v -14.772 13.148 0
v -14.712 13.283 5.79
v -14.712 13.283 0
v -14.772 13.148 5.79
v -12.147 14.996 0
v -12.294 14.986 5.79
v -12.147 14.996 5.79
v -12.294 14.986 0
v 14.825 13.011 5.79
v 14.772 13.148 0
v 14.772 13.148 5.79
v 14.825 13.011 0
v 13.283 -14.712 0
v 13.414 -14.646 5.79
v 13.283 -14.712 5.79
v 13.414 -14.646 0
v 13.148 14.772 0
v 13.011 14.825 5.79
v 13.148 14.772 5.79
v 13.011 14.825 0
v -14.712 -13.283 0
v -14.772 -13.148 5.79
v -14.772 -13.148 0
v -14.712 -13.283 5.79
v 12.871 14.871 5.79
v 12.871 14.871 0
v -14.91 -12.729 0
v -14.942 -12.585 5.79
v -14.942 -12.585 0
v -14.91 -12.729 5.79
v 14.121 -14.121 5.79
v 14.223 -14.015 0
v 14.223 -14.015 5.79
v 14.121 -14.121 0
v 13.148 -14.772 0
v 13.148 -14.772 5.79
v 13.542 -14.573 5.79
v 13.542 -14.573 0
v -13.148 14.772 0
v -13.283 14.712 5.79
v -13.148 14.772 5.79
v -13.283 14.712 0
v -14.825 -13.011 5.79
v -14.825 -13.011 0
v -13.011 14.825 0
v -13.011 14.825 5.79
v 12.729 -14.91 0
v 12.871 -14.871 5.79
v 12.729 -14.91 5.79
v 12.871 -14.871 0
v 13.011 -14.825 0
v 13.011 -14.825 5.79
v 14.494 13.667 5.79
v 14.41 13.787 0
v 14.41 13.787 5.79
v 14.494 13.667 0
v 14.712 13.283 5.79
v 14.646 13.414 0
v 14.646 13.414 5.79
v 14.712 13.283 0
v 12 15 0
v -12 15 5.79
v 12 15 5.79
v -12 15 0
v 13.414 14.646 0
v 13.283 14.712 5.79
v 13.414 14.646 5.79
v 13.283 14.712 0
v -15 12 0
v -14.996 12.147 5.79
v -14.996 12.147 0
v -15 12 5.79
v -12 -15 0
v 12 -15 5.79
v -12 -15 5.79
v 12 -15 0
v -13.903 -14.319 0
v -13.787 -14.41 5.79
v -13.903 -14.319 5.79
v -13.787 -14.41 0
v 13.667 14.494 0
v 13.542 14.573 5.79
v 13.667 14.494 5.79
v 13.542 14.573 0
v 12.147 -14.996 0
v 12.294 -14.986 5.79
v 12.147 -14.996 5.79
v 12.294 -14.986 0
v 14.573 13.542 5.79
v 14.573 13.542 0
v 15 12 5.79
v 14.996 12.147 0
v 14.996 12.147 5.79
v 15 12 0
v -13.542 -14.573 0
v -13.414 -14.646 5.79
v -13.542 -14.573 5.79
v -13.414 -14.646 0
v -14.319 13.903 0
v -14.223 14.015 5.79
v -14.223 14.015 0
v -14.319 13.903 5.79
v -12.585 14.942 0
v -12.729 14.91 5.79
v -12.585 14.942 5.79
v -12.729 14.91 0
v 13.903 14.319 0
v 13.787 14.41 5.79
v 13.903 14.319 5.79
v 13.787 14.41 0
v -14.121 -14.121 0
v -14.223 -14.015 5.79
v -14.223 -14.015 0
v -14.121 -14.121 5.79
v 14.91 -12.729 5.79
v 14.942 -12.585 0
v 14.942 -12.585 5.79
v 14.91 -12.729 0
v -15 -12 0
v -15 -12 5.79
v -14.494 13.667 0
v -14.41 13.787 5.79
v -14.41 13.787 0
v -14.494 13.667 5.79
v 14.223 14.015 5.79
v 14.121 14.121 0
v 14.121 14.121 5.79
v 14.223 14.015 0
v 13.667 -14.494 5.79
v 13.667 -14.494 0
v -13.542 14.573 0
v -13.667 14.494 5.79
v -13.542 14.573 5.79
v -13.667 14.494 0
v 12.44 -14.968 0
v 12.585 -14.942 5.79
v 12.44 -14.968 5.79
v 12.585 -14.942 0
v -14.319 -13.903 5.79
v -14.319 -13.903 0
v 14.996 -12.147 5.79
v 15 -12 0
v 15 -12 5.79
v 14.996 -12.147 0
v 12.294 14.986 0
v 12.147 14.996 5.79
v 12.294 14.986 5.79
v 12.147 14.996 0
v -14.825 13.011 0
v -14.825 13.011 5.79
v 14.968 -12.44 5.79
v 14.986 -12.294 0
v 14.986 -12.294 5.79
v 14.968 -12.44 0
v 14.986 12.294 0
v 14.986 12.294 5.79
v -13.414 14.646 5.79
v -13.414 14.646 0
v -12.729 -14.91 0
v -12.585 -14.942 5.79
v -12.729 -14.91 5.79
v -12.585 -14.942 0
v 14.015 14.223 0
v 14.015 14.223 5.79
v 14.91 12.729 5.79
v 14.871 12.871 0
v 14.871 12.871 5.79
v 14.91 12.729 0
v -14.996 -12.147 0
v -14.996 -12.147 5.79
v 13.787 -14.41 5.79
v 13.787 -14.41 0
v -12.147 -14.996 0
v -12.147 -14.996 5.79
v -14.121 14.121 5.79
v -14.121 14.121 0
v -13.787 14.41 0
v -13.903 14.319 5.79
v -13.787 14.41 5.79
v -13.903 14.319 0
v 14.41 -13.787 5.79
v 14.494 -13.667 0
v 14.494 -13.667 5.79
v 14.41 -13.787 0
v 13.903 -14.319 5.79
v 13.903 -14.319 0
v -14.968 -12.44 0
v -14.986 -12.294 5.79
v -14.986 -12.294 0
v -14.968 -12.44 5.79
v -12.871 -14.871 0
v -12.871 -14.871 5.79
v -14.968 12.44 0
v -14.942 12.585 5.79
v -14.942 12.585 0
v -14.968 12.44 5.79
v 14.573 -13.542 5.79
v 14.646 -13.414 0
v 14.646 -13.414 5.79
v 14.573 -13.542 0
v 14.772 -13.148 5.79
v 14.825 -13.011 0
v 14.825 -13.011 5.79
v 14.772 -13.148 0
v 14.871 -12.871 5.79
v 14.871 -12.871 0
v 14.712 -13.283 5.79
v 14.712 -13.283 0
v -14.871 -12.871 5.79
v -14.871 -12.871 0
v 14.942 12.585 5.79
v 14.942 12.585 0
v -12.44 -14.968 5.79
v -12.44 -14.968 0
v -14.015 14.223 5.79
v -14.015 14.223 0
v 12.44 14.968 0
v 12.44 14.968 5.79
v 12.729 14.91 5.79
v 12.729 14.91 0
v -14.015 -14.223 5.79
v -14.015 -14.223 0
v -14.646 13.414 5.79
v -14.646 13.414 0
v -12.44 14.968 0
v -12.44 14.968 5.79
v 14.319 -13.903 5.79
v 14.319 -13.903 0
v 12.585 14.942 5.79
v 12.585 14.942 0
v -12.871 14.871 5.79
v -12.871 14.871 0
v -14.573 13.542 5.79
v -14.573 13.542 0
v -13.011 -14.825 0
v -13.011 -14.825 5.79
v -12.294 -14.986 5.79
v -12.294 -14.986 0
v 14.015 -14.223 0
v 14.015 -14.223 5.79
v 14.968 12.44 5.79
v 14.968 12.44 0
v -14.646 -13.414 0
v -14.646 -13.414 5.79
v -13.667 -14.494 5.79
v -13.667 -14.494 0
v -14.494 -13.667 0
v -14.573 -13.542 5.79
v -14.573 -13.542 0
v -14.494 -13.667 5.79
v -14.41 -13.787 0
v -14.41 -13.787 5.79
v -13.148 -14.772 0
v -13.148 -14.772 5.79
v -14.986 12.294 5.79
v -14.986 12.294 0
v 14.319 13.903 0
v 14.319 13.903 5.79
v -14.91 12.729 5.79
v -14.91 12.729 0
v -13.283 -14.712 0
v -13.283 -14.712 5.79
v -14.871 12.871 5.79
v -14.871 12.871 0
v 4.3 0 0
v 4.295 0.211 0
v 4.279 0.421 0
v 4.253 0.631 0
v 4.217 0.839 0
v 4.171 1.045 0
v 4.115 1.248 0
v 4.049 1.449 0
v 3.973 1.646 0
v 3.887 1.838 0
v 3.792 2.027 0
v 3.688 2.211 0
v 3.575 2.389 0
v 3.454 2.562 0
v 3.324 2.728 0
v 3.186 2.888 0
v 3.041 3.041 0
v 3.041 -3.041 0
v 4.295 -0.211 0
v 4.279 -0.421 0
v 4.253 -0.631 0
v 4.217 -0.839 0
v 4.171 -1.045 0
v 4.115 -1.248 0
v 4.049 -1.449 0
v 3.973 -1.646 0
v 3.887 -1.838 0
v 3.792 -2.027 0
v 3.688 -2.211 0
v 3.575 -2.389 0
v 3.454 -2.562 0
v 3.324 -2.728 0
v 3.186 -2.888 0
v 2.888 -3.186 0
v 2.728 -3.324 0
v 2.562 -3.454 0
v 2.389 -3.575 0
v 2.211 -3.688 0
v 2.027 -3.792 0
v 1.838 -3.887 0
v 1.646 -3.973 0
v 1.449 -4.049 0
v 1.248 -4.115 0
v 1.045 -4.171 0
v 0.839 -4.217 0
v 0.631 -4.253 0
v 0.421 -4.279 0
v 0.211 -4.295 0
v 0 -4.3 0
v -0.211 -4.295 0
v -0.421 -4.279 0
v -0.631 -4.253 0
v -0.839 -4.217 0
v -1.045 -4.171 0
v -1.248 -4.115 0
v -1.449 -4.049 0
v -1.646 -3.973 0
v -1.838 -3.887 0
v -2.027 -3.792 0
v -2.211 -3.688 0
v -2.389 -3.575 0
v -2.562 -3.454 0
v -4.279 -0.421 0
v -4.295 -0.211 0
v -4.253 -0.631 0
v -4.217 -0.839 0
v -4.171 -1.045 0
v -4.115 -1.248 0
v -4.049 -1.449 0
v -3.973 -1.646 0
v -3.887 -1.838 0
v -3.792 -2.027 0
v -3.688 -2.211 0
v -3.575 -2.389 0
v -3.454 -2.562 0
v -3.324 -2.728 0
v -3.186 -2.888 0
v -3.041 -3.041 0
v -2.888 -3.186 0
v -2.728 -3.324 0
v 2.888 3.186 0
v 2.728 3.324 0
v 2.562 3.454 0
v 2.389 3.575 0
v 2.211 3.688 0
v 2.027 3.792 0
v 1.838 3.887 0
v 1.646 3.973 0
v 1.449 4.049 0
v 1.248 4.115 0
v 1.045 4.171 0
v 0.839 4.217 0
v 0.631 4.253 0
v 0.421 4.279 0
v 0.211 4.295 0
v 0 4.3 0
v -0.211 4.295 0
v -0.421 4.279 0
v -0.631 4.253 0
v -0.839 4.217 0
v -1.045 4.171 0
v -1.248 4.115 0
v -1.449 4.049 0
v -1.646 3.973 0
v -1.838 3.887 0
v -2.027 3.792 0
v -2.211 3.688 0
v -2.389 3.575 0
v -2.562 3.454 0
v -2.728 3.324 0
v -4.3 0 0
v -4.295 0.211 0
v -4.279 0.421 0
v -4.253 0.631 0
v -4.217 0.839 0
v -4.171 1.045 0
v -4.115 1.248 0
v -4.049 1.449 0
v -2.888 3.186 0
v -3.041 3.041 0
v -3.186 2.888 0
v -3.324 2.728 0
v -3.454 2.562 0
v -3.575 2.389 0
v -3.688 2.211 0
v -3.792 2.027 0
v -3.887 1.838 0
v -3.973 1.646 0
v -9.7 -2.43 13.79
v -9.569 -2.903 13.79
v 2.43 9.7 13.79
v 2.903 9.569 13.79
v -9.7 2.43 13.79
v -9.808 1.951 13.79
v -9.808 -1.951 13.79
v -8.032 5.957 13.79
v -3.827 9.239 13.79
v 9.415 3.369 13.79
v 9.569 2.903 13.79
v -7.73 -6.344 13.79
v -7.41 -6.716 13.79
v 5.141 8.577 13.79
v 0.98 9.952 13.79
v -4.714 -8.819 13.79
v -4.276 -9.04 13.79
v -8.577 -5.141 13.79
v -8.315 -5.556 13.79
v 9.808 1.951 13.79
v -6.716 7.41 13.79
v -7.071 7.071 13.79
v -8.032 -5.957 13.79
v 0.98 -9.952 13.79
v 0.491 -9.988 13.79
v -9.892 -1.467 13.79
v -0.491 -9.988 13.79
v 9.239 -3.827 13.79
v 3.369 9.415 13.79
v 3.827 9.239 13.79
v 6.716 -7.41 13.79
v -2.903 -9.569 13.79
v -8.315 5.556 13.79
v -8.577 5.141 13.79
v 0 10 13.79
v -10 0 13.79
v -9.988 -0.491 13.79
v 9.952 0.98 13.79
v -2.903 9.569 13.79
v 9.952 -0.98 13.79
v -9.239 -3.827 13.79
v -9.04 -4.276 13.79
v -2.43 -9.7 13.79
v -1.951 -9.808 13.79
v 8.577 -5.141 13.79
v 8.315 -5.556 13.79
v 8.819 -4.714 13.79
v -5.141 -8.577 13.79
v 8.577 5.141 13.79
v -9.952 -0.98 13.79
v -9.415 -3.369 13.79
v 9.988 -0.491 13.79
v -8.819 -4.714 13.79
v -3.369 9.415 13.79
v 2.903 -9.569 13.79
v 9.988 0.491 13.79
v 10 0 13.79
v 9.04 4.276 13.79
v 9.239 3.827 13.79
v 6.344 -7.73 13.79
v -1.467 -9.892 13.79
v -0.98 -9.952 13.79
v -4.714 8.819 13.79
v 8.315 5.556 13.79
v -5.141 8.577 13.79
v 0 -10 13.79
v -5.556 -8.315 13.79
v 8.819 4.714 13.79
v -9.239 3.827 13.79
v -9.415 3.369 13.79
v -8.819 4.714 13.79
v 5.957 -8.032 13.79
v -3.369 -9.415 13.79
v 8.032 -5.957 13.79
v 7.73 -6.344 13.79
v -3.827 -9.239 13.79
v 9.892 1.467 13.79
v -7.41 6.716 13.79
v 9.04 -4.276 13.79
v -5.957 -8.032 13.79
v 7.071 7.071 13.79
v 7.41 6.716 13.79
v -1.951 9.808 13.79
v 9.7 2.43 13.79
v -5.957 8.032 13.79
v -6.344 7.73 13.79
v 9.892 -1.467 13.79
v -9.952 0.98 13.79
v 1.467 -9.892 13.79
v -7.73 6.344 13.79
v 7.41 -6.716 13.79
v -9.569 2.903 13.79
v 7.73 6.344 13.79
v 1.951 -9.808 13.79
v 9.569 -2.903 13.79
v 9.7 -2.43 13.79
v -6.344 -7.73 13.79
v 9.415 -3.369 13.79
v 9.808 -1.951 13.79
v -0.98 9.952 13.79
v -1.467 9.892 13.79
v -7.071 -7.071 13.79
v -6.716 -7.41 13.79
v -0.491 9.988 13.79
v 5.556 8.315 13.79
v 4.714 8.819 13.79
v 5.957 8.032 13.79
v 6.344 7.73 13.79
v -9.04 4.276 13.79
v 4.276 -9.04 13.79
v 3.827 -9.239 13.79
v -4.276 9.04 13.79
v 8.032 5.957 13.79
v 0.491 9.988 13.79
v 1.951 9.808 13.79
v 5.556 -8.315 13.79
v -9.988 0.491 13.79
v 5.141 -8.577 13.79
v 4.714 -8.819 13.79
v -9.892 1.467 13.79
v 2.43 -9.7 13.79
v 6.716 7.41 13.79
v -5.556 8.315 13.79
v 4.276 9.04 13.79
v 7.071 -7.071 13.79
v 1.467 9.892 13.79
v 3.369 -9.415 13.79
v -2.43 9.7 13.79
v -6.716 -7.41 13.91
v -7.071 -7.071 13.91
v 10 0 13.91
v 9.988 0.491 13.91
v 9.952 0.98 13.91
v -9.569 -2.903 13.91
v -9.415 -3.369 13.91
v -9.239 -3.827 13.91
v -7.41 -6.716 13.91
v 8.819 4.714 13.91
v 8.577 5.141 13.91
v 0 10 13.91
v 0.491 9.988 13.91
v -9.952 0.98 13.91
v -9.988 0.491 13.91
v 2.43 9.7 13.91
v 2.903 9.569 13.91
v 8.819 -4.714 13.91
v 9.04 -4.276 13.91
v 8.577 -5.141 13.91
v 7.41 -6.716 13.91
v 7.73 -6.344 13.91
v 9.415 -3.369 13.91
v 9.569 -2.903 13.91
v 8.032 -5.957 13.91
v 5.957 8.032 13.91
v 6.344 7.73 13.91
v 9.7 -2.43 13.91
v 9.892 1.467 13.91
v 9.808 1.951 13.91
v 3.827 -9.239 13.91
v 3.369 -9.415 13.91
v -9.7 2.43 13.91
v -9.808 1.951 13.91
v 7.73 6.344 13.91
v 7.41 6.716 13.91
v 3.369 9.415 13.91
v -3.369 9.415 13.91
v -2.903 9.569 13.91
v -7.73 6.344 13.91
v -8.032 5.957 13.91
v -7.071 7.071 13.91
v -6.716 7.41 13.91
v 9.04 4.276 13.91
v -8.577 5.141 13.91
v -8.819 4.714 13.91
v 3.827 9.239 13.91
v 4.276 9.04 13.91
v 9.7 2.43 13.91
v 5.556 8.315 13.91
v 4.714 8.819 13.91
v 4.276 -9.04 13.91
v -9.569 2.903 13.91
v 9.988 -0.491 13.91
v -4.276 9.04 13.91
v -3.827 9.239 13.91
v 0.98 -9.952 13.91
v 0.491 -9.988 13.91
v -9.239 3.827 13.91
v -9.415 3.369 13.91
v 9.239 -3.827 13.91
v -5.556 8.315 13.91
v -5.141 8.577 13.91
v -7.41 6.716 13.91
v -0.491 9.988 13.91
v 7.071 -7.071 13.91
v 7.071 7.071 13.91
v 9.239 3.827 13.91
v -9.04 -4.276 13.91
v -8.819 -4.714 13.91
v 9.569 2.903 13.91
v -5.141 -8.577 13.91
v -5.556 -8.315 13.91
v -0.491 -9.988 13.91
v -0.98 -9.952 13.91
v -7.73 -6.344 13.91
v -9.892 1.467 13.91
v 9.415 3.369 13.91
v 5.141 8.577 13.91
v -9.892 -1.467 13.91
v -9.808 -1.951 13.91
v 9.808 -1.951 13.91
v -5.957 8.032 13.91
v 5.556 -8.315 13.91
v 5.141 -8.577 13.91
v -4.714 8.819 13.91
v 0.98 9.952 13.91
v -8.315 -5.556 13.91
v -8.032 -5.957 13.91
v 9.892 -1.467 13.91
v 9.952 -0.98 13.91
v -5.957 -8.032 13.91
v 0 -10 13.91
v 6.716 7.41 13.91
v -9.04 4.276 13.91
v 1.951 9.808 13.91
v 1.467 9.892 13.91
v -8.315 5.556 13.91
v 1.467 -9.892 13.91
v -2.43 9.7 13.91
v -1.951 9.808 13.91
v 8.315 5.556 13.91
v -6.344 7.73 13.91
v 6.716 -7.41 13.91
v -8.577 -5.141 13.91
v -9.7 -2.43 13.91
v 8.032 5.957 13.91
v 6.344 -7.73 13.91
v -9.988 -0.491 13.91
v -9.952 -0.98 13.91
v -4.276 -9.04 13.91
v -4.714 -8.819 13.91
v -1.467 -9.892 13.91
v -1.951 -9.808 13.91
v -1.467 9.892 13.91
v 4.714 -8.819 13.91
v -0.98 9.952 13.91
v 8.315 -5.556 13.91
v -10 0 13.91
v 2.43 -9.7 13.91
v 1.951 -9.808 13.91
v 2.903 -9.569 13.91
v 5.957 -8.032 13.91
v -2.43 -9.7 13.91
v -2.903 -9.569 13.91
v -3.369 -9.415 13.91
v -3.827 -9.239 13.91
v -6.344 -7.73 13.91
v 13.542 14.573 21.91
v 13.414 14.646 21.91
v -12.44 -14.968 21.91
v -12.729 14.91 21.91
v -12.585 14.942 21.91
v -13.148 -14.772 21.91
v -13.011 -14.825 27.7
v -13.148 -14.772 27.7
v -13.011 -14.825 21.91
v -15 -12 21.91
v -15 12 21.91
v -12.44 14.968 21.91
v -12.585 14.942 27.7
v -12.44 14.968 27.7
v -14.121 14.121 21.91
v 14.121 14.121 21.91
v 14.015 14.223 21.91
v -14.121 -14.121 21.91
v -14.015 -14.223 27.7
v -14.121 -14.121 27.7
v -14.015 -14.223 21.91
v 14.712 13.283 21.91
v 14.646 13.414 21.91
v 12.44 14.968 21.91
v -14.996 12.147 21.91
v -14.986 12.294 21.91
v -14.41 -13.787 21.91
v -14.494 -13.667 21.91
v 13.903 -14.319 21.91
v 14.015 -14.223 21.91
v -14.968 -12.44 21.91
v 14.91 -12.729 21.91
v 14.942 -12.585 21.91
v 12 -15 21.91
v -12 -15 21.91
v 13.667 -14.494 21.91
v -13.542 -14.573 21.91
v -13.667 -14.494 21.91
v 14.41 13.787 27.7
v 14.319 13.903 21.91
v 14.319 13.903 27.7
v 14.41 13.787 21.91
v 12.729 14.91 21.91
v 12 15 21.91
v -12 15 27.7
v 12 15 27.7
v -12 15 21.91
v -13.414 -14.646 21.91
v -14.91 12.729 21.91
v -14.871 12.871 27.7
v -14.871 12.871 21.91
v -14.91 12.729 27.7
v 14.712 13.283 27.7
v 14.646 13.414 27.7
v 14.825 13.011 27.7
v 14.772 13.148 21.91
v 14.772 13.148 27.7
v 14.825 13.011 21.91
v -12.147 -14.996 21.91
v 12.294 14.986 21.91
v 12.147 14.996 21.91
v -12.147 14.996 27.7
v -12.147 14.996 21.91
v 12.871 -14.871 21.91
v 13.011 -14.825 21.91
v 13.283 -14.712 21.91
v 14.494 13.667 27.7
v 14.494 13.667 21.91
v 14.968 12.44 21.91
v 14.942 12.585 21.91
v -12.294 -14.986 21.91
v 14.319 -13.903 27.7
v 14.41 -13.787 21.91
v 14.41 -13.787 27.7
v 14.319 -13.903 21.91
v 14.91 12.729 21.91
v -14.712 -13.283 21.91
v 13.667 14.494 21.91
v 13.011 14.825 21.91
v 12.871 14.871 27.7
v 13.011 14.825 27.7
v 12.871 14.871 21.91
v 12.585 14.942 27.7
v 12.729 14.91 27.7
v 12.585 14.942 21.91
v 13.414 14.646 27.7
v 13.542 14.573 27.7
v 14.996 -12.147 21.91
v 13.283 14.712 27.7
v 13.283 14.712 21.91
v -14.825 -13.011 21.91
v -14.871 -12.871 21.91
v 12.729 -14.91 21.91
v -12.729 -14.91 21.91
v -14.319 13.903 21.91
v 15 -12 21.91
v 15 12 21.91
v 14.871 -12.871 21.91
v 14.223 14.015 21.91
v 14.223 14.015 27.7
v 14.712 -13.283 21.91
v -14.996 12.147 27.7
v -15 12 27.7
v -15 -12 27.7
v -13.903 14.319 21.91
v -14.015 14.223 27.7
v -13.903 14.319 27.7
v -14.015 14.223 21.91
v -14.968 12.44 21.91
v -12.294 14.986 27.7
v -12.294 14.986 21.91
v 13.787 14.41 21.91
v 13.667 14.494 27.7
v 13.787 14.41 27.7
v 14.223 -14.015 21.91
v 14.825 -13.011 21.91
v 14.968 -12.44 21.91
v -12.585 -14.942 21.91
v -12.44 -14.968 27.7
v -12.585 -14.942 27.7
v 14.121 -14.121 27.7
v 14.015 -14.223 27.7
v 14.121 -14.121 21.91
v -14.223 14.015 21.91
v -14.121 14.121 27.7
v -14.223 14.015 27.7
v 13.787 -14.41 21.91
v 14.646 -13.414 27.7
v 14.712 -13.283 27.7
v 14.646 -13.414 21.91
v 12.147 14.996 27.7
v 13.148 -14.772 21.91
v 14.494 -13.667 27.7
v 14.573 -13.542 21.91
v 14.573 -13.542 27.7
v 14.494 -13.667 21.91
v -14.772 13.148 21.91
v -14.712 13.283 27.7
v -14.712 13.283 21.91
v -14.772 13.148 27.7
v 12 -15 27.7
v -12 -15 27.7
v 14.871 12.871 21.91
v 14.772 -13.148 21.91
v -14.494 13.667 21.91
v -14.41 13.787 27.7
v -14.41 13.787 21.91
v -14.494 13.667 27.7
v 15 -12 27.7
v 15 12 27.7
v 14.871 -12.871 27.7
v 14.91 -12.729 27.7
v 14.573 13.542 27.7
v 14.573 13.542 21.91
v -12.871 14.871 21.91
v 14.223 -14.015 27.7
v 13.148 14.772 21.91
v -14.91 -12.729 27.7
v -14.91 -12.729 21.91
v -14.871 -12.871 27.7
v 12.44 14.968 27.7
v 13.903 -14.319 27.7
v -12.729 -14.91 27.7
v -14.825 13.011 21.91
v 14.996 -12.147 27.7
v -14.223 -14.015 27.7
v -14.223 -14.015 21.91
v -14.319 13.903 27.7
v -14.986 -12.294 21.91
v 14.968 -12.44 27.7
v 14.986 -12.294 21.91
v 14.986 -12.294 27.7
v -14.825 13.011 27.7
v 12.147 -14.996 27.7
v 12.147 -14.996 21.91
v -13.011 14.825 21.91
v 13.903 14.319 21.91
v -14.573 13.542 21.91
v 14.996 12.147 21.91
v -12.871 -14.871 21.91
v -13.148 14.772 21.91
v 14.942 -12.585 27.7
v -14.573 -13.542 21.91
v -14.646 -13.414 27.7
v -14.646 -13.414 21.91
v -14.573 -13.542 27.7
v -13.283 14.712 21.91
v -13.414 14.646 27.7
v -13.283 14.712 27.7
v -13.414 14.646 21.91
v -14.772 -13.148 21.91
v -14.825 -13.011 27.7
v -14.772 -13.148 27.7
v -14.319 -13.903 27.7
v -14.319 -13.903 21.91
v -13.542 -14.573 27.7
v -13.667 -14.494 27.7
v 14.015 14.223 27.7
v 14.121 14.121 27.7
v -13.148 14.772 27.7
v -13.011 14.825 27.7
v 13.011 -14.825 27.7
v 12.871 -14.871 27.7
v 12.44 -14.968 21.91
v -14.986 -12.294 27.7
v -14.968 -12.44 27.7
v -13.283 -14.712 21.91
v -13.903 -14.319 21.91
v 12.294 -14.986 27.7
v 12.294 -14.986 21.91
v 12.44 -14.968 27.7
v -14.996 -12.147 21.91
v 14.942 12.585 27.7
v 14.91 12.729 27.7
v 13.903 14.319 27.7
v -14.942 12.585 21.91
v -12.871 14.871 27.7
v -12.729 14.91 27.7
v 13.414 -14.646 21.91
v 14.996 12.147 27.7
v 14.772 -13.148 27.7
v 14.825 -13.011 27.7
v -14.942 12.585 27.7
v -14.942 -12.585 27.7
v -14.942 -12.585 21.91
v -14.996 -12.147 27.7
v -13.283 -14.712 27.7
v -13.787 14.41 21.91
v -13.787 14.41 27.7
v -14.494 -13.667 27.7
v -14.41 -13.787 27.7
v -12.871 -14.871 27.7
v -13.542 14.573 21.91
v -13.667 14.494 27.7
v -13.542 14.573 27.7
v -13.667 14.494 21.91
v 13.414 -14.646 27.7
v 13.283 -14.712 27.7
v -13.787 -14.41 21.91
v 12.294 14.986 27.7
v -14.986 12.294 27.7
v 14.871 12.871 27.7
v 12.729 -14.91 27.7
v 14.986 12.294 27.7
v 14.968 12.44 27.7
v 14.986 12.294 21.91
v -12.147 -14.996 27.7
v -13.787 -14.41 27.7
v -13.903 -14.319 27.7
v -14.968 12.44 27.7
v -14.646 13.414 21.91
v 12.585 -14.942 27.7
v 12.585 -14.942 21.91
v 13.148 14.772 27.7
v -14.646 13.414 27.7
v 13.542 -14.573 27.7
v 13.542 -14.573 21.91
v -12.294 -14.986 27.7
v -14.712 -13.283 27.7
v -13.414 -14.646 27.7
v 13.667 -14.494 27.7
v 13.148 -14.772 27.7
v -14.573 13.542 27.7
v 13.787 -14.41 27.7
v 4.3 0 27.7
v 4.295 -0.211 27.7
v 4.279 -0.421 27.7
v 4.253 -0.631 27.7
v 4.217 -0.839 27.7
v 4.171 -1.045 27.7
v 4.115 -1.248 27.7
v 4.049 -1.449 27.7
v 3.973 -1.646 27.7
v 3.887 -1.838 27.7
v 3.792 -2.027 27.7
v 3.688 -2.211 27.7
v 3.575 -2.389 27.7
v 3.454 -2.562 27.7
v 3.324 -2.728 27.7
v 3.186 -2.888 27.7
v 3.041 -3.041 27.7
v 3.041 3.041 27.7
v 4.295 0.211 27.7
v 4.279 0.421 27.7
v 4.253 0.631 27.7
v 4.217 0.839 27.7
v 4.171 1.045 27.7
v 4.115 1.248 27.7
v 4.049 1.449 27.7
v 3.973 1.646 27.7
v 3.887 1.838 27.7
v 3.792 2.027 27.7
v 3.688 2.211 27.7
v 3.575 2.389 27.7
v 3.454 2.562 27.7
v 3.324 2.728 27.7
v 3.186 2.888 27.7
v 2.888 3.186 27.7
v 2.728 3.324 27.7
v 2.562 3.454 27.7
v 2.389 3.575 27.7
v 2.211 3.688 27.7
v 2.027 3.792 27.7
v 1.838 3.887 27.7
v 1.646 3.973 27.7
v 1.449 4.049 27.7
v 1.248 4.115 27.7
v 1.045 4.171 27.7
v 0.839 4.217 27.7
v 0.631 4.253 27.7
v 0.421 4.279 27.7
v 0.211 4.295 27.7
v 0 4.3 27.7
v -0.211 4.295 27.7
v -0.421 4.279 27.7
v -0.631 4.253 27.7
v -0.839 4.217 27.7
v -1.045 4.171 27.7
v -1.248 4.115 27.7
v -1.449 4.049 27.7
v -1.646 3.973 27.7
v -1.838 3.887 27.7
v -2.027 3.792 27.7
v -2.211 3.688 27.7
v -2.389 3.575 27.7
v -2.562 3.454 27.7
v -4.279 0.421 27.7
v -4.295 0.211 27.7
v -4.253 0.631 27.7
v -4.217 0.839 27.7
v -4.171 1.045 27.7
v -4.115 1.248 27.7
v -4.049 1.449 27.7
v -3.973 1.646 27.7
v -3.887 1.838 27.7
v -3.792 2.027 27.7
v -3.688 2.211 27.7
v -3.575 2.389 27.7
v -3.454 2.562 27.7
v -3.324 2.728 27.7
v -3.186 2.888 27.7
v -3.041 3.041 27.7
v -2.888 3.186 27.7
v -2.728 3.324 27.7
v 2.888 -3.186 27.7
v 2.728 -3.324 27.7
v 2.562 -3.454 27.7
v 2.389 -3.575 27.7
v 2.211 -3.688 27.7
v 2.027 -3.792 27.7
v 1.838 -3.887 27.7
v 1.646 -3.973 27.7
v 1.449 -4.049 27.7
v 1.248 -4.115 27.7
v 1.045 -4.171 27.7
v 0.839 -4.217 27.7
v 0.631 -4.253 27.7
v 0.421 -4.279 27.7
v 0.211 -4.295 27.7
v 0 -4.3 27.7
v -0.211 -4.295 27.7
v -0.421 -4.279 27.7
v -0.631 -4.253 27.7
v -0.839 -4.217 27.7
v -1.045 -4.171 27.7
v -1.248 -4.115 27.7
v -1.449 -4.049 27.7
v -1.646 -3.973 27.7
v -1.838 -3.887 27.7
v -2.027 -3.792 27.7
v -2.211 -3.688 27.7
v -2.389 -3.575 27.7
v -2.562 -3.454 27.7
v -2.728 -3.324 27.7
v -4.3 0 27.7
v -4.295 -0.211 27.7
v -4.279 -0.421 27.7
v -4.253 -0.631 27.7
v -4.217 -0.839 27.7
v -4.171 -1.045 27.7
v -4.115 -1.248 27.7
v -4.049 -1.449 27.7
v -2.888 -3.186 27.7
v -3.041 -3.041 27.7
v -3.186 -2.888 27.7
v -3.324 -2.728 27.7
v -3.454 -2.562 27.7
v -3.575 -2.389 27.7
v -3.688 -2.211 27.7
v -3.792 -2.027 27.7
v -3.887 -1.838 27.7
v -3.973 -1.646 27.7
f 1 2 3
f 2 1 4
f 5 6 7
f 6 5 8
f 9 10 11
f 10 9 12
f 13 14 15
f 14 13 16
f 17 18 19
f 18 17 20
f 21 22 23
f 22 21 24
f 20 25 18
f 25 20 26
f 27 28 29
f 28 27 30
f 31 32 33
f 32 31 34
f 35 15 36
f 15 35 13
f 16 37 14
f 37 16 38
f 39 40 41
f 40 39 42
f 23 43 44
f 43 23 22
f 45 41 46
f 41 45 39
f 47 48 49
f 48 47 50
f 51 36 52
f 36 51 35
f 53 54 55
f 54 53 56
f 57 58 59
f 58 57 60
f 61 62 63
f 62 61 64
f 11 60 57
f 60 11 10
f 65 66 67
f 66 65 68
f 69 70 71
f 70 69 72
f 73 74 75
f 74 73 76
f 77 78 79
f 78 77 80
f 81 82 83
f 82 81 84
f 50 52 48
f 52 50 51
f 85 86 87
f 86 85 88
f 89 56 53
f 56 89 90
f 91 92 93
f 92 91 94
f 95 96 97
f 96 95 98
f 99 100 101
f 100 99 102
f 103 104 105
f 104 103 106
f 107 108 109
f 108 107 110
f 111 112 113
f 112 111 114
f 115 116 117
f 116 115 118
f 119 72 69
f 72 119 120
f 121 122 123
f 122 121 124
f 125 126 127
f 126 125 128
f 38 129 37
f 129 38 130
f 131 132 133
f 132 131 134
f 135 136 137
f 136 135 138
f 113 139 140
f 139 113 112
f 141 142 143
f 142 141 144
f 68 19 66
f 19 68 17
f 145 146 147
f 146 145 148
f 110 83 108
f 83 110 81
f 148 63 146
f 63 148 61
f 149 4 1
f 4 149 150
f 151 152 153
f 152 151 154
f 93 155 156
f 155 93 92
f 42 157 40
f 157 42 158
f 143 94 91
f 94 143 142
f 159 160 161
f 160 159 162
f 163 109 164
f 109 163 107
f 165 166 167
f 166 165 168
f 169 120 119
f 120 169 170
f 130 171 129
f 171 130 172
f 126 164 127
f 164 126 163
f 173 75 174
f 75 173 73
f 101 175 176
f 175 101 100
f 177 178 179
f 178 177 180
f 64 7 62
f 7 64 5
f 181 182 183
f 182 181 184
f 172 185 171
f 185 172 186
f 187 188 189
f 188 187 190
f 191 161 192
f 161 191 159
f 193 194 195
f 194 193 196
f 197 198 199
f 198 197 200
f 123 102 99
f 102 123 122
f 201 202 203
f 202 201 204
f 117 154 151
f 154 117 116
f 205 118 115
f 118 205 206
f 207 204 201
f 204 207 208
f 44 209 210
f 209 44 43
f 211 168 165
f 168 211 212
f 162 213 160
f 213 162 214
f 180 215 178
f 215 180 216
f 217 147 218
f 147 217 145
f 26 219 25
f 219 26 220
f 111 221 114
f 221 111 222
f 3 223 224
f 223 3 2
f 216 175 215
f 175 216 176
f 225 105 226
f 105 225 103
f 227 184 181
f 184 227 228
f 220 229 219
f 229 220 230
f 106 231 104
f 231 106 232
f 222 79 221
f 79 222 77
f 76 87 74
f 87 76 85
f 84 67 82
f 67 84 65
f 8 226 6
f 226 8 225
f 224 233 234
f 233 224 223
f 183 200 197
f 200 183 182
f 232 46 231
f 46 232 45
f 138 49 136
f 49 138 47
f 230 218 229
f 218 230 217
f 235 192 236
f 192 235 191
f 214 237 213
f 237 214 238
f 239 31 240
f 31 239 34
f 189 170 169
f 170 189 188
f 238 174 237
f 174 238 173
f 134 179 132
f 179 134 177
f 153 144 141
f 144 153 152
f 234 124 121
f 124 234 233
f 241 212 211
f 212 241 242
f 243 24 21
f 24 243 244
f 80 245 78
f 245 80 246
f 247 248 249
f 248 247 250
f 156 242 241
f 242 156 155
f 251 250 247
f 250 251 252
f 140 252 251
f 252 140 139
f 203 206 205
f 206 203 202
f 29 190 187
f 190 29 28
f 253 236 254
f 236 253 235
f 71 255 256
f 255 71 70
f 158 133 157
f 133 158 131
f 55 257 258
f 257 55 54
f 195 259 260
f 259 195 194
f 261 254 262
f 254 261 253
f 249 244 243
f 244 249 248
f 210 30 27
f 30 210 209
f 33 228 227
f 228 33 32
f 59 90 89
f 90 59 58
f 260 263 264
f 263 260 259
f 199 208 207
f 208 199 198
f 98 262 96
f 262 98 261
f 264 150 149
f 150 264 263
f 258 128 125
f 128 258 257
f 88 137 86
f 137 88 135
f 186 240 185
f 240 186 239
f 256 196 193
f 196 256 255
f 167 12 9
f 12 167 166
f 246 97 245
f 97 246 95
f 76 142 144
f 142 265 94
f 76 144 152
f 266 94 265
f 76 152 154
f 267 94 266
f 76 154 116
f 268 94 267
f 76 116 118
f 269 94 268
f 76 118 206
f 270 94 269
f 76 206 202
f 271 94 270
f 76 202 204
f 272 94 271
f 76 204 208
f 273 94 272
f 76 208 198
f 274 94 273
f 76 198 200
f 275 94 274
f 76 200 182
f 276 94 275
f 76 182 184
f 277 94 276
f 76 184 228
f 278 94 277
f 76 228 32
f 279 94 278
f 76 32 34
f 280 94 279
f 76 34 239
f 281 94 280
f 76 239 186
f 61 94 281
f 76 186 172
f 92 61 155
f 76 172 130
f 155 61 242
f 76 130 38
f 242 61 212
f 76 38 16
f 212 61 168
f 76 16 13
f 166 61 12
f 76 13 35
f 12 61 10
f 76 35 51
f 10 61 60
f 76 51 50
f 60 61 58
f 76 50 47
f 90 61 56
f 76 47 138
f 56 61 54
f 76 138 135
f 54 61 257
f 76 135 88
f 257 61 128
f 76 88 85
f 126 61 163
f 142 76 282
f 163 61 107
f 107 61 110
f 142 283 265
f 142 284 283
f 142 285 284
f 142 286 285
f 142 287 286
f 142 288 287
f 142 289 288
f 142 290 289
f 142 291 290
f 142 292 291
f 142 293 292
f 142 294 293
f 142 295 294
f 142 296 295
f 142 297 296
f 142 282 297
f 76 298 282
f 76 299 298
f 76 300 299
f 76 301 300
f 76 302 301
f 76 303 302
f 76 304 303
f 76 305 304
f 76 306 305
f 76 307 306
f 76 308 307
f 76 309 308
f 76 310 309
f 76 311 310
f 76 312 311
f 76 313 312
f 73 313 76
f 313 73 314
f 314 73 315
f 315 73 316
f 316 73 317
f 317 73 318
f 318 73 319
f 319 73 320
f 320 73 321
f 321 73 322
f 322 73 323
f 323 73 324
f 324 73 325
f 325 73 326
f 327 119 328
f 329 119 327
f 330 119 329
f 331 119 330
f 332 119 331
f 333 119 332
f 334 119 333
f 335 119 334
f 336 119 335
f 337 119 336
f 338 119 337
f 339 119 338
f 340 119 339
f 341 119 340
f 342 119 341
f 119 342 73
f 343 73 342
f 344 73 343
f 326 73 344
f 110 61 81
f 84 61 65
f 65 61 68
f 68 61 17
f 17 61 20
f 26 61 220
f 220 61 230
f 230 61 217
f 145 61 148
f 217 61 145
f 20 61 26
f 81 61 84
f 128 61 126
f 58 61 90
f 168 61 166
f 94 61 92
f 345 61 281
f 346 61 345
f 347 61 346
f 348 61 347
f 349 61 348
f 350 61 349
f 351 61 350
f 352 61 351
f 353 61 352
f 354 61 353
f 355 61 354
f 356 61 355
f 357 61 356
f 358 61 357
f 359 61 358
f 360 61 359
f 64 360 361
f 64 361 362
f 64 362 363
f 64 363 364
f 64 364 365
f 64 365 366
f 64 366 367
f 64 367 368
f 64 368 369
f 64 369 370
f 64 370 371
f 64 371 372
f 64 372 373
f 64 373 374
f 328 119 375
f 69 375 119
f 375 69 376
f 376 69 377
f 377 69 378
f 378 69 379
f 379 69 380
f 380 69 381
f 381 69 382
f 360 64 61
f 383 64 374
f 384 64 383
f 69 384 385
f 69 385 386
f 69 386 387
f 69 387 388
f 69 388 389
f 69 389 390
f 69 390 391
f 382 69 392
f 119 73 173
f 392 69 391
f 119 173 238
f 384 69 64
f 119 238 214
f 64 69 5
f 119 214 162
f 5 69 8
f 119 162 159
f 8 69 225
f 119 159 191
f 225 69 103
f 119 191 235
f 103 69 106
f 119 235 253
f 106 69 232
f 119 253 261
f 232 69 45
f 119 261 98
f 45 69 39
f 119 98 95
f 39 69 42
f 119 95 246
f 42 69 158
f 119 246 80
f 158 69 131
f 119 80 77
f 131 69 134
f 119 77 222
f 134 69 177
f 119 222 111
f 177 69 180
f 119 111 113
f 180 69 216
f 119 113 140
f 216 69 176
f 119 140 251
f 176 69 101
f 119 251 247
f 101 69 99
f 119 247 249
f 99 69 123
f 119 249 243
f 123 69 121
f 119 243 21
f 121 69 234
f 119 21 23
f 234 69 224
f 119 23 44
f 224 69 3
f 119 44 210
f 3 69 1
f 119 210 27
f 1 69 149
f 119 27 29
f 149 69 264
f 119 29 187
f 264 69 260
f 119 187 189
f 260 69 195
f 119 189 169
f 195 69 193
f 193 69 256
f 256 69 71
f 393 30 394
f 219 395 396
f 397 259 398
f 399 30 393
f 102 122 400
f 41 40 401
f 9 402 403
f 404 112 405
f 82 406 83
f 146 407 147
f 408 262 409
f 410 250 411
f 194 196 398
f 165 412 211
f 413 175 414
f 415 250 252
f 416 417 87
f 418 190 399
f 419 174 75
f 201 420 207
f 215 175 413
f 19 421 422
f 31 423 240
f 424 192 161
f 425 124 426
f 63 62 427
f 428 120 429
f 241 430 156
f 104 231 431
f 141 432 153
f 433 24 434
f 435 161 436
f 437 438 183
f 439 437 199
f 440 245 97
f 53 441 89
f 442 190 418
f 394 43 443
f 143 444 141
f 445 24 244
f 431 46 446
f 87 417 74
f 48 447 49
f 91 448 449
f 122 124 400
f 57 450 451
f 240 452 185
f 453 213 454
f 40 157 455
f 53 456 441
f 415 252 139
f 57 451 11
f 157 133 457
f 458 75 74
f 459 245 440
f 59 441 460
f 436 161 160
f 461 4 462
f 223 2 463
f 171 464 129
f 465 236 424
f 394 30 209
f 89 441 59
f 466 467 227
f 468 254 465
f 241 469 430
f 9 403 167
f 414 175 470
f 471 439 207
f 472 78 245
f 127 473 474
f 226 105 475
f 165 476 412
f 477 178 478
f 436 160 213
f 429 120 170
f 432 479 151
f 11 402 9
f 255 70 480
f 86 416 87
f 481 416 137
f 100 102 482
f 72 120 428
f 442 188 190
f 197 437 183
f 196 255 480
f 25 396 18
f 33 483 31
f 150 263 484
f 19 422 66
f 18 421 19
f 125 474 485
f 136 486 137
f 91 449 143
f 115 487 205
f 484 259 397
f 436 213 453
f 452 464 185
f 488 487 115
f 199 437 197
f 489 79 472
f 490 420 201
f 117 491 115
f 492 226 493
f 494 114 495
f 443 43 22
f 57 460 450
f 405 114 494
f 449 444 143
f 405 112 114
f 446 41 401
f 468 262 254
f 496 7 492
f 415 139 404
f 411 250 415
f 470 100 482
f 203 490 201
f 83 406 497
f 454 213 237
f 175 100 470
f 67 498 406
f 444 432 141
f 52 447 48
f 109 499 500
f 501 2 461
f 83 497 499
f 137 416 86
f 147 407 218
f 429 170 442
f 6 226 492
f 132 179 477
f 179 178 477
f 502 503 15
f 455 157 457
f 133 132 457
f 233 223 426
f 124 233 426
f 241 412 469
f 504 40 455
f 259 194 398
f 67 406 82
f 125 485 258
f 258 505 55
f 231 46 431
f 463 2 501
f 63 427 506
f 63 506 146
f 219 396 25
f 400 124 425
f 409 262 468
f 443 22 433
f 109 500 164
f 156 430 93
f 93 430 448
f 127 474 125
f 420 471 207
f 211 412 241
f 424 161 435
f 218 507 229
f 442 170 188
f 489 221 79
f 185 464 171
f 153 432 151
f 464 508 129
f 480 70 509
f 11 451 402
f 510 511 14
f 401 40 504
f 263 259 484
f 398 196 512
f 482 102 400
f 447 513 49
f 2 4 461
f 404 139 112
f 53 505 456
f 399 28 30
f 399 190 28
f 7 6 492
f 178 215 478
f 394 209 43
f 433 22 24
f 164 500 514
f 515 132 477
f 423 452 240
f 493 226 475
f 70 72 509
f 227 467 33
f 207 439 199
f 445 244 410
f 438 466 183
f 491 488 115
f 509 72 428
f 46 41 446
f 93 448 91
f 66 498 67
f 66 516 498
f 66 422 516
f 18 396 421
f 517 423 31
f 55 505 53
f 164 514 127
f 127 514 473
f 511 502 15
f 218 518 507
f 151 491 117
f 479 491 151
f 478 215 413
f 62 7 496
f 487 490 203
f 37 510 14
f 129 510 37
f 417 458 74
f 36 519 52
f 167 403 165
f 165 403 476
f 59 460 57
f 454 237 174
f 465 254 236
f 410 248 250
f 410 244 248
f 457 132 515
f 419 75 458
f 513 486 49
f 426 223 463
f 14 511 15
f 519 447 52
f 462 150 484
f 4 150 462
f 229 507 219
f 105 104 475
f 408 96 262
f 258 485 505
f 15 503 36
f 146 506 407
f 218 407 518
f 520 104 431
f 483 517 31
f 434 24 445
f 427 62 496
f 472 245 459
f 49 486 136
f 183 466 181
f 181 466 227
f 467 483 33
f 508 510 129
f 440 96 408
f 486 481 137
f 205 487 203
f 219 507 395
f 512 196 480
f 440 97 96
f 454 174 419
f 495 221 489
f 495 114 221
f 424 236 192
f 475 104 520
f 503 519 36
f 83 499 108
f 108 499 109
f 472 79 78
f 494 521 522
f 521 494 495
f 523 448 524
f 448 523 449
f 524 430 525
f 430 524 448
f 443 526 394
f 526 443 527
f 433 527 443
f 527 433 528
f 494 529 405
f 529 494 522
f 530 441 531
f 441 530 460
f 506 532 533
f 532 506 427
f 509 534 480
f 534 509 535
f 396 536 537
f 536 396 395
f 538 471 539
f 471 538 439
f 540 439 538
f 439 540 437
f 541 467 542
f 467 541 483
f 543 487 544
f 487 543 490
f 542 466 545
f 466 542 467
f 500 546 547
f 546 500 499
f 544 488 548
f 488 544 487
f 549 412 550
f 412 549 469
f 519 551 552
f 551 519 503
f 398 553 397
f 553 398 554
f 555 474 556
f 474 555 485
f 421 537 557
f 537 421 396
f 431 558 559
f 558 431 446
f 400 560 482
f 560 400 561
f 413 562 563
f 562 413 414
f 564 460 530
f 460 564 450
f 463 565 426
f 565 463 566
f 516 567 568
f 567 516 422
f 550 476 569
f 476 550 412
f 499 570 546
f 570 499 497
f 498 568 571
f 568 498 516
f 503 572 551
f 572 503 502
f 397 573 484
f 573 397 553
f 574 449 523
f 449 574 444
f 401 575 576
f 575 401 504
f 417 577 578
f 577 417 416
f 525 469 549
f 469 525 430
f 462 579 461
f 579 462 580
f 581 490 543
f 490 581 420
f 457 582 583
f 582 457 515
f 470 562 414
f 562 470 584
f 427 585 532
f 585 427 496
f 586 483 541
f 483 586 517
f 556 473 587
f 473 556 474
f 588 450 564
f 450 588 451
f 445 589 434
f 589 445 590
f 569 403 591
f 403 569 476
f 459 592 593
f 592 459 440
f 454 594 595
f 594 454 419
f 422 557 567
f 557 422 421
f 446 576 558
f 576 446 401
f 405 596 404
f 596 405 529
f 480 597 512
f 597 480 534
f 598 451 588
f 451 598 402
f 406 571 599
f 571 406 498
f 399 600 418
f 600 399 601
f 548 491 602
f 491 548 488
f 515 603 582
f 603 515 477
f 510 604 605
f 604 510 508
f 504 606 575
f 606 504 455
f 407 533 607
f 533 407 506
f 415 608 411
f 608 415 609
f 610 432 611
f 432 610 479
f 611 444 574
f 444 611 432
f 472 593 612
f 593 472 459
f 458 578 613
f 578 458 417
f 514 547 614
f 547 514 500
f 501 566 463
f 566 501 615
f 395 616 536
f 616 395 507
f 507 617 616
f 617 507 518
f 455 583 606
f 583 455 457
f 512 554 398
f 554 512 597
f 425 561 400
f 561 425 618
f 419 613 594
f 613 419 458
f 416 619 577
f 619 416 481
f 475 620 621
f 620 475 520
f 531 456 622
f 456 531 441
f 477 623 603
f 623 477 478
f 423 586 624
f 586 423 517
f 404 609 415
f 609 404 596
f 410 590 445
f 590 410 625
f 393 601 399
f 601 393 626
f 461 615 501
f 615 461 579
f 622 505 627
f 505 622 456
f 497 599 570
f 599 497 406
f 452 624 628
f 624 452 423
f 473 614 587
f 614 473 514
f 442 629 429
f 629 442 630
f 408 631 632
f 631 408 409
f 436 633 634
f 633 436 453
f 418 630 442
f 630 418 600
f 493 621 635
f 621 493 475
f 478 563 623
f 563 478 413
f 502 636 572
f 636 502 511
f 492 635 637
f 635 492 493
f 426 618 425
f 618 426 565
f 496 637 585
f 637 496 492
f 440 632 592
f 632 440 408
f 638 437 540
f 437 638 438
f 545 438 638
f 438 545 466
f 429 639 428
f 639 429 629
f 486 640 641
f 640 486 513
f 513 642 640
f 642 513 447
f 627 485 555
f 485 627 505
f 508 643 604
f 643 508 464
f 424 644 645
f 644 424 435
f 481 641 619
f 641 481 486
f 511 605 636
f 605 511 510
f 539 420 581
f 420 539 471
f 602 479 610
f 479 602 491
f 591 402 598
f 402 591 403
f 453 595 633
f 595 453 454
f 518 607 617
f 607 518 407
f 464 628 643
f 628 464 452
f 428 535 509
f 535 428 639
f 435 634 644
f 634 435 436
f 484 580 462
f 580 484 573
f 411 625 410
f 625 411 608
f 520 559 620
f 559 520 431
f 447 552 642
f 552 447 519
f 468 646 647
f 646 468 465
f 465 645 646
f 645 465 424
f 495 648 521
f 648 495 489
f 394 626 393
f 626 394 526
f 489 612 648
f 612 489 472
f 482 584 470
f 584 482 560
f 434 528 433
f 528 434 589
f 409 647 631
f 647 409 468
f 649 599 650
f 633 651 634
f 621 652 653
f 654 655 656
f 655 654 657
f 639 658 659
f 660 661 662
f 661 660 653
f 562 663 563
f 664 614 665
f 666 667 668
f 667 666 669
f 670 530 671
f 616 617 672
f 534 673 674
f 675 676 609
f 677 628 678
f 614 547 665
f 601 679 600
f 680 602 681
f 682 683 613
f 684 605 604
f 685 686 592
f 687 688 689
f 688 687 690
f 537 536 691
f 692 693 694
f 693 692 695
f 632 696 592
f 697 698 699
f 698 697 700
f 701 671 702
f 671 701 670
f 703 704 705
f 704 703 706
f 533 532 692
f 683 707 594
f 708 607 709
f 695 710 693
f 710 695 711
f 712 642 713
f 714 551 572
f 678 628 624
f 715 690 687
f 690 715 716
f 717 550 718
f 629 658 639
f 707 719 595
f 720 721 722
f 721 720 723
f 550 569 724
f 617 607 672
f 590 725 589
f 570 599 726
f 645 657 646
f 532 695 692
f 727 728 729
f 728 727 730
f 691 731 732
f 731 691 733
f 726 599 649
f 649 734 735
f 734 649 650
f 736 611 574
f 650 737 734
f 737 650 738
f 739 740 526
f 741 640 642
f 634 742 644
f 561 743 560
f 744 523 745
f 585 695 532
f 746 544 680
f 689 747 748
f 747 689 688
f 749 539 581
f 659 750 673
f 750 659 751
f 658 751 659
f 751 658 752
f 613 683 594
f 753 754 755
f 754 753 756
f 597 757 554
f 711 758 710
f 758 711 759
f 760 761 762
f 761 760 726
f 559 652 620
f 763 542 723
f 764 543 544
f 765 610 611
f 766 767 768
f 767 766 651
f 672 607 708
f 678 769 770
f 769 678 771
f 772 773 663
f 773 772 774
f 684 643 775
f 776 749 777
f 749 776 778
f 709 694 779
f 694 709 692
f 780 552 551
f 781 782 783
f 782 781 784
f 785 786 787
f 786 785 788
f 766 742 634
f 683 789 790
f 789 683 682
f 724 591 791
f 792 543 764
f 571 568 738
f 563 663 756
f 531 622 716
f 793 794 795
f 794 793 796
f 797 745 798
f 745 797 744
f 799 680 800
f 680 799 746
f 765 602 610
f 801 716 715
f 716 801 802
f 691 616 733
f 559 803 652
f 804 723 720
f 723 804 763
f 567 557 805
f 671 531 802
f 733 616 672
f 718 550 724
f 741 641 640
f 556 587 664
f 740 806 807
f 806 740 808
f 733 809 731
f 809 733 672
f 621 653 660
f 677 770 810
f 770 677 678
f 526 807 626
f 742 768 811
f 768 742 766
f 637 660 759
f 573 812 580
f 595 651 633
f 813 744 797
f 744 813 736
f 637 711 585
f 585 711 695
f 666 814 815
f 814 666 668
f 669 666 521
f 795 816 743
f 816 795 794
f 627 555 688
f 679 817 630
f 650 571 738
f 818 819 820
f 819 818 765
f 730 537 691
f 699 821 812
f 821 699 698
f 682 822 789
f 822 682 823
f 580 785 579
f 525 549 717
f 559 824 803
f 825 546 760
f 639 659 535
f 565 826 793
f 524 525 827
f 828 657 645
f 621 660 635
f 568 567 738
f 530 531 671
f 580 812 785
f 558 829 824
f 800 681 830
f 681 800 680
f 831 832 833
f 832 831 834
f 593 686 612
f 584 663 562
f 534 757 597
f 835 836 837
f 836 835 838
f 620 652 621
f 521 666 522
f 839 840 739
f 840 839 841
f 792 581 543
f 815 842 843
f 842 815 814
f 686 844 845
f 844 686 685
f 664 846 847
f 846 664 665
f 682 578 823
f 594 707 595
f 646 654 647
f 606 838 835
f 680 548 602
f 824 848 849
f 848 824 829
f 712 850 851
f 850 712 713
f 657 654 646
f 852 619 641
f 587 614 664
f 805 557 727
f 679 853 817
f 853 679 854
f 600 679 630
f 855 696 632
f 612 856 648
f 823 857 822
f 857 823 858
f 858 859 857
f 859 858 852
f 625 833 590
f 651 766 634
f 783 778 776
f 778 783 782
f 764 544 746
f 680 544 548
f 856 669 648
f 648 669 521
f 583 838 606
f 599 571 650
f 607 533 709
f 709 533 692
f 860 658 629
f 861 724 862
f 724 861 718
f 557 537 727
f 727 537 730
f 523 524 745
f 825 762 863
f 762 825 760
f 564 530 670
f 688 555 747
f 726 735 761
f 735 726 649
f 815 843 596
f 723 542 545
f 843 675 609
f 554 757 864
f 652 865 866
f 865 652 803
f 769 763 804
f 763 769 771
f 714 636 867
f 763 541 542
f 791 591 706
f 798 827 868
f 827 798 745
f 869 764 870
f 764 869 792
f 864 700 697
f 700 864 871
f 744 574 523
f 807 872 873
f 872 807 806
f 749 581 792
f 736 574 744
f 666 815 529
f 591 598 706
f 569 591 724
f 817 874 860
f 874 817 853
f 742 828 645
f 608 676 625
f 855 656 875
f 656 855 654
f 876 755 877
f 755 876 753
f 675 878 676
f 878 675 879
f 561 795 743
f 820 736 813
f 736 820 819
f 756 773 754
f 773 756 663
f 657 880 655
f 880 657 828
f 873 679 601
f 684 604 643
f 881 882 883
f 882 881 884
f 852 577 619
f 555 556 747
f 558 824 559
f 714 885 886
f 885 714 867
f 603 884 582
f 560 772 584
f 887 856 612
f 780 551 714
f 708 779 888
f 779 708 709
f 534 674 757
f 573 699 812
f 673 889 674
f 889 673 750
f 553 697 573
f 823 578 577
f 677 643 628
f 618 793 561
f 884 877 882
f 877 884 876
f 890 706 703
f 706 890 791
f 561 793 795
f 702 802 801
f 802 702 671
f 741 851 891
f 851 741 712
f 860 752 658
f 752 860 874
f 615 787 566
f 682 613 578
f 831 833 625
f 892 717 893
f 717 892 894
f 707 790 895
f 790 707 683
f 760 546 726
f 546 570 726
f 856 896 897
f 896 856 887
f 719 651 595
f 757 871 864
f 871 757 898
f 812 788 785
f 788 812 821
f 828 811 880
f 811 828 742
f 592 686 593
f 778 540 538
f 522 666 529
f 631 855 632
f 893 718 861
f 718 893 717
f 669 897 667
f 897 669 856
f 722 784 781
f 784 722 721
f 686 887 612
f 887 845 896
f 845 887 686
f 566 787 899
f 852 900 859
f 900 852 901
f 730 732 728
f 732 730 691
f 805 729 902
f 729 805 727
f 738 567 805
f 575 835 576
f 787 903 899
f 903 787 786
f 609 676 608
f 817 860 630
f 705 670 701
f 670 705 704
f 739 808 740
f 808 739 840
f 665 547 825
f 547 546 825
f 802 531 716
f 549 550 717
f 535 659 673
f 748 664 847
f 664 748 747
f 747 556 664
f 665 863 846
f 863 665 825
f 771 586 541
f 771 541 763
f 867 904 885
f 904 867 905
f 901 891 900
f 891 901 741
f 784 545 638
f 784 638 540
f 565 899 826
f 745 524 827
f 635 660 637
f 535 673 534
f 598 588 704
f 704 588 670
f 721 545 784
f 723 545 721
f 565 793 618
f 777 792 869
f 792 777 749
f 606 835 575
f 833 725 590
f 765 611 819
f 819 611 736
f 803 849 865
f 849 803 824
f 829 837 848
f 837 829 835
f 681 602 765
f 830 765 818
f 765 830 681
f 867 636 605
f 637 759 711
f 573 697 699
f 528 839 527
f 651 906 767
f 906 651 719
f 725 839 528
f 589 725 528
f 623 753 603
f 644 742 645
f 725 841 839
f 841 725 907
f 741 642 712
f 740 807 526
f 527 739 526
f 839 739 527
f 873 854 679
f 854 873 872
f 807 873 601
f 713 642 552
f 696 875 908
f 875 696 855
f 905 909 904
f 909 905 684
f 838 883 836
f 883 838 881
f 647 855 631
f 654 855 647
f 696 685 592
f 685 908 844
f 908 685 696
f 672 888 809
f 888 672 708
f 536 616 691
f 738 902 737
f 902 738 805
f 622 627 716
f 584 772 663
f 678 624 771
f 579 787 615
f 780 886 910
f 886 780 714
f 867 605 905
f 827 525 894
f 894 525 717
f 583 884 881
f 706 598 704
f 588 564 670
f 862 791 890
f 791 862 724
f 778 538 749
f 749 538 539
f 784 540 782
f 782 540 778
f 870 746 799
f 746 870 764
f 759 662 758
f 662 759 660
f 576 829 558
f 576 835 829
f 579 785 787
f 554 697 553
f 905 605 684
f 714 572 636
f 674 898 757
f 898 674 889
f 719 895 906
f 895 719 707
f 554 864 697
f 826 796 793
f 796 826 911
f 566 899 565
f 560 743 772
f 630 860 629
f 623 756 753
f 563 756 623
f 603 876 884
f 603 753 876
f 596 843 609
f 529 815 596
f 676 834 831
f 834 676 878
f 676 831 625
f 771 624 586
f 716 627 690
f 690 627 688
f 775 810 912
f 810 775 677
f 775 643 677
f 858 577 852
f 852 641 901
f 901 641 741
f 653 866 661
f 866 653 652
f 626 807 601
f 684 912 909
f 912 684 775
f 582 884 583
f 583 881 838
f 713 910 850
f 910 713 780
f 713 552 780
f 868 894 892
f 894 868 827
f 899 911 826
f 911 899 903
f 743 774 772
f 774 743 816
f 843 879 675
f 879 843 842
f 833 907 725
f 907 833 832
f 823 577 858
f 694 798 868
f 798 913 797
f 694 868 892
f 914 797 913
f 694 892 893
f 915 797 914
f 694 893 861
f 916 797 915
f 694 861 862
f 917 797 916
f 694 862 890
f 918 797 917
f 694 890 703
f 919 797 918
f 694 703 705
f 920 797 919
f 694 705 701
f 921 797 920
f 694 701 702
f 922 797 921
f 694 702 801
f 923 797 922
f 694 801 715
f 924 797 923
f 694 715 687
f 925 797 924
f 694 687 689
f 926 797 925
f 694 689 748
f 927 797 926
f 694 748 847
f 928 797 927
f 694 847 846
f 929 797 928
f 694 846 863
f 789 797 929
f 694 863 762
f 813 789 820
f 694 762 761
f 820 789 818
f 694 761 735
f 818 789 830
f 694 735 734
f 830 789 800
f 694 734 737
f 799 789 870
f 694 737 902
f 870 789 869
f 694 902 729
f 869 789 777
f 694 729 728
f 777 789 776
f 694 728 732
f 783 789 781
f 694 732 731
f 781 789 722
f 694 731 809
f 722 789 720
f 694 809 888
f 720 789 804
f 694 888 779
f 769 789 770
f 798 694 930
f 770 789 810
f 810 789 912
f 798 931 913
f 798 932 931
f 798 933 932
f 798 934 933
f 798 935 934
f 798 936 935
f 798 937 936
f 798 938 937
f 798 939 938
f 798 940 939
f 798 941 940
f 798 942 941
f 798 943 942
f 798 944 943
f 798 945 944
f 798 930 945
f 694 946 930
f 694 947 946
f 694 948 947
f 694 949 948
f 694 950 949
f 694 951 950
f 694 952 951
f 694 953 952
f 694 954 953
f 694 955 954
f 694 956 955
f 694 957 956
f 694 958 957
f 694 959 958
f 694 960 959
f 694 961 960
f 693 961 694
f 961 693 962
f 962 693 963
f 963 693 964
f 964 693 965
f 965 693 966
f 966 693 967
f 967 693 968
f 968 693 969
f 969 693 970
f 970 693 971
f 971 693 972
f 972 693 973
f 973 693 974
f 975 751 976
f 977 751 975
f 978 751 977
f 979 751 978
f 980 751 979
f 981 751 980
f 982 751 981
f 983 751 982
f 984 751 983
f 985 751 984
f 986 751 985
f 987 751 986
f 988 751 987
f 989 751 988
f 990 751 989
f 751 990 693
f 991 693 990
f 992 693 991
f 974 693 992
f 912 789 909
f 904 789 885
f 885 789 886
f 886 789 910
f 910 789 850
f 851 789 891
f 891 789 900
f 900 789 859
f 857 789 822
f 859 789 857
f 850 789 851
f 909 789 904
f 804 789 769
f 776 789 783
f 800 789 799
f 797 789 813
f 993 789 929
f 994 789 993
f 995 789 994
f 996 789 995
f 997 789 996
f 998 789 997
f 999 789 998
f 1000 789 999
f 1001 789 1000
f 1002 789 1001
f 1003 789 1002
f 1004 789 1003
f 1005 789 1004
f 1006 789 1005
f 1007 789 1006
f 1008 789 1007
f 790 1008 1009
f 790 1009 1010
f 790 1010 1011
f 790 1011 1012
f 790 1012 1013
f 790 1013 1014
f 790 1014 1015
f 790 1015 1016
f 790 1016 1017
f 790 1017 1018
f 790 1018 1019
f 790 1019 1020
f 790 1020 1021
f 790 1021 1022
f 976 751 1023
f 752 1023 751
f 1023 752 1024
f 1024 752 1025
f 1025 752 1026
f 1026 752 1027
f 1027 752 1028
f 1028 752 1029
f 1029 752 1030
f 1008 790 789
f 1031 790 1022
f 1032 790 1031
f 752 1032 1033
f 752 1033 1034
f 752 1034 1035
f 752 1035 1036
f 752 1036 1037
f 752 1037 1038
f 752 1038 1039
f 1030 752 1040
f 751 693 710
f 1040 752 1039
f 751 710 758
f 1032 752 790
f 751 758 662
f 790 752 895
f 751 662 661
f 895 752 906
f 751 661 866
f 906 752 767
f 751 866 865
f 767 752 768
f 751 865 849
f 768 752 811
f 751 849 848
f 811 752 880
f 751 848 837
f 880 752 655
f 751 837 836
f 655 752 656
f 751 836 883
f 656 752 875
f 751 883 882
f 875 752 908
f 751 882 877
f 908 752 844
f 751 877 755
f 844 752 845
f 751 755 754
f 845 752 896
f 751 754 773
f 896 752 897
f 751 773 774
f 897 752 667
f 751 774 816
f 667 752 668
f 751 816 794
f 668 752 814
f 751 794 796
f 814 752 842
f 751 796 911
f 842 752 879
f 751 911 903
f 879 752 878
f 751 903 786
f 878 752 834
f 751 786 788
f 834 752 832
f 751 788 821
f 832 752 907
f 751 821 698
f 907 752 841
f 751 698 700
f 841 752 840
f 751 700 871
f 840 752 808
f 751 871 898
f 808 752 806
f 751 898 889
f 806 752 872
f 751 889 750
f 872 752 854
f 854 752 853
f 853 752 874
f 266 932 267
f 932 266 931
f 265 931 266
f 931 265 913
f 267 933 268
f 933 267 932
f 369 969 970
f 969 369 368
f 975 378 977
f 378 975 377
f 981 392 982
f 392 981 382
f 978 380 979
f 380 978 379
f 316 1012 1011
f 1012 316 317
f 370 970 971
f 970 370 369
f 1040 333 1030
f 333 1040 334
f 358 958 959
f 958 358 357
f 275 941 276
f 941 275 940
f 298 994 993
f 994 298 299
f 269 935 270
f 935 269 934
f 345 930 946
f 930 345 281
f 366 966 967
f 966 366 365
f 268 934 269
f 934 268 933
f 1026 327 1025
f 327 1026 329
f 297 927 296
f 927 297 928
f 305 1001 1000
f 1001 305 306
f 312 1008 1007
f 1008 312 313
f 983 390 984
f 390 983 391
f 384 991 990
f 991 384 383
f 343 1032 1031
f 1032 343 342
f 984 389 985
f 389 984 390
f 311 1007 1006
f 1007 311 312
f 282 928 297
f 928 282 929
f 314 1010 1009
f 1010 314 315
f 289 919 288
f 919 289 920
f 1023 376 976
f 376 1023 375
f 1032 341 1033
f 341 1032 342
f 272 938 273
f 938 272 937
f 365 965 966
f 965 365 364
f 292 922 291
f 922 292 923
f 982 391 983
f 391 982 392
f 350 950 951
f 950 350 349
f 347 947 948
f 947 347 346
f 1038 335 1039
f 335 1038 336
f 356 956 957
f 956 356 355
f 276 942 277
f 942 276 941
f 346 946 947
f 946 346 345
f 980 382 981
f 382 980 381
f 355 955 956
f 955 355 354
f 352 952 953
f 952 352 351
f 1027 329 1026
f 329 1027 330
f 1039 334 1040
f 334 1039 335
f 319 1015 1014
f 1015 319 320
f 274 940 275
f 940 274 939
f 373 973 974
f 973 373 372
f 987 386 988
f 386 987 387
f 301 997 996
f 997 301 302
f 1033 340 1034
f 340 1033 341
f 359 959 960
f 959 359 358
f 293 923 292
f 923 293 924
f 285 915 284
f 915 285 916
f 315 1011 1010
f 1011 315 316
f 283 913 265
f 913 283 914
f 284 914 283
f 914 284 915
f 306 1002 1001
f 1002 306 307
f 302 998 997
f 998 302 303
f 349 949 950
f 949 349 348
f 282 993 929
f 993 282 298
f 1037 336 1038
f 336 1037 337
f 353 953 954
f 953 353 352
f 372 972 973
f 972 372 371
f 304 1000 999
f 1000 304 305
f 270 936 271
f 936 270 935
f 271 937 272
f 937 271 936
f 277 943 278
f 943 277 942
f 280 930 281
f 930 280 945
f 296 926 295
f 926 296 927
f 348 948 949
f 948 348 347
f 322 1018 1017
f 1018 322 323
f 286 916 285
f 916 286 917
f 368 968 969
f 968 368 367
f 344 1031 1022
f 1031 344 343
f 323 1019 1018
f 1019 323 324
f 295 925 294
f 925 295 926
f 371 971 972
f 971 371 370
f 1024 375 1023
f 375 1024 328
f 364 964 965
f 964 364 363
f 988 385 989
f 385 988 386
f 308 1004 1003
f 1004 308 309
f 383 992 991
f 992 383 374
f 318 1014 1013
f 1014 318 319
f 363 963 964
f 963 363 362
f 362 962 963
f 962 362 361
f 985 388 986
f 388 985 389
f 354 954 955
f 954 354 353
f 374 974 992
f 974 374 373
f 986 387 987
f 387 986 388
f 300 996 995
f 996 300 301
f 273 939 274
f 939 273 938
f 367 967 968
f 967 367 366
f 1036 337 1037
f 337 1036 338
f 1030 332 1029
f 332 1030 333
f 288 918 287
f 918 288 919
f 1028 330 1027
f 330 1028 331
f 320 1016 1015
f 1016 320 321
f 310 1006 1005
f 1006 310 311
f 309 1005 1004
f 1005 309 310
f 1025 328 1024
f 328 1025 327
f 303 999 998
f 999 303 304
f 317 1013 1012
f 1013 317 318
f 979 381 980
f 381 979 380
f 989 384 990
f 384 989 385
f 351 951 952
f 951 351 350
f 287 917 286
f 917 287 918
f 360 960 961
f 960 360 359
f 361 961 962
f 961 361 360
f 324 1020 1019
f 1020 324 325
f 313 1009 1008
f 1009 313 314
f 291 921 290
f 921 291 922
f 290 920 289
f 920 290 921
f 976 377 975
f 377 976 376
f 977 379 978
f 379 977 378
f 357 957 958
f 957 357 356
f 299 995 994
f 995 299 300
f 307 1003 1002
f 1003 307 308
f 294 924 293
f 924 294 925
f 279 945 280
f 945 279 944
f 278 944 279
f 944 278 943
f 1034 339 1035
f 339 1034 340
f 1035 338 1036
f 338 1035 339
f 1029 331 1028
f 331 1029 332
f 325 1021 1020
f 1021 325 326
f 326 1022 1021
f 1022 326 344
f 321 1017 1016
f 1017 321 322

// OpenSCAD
$fn = 128;

// V70 spindle support / distance sleeve
// Slides over the Ø8 RH8x2 working screw and bridges the measured 27.7 mm gap
// between base and clamp. Identical part can be used on all four screws.
// Broad end pads spread lateral load into both parts and reduce free screw span.

length = 27.70;
bore_d = 8.60;          // 0.30 mm radial running clearance over Ø8 screw
pad_xy = 30.00;         // maximum symmetric square around spindle axis at 15 mm from edges
pad_r = 3.00;
pad_t = 5.00;
tube_d = 20.00;
transition_h = 8.00;

module rounded_square_2d(size, r) {
    offset(r=r)
        square([size-2*r, size-2*r], center=true);
}

module pad(h) {
    linear_extrude(height=h)
        rounded_square_2d(pad_xy, pad_r);
}

module end_transition(z0, flip=false) {
    if (!flip) {
        hull() {
            translate([0,0,z0])
                linear_extrude(height=0.8)
                    rounded_square_2d(pad_xy, pad_r);
            translate([0,0,z0+transition_h])
                cylinder(d=tube_d,h=0.8);
        }
    } else {
        hull() {
            translate([0,0,z0])
                cylinder(d=tube_d,h=0.8);
            translate([0,0,z0+transition_h])
                linear_extrude(height=0.8)
                    rounded_square_2d(pad_xy, pad_r);
        }
    }
}

difference() {
    union() {
        pad(pad_t);
        end_transition(pad_t-0.01, false);

        // Short central overlap keeps the two broad transitions tied together.
        translate([0,0,pad_t+transition_h-0.01])
            cylinder(d=tube_d,
                     h=max(0.02, length-2*(pad_t+transition_h)+0.02));

        end_transition(length-pad_t-transition_h-0.79, true);
        translate([0,0,length-pad_t])
            pad(pad_t);
    }

    translate([0,0,-0.5])
        cylinder(d=bore_d,h=length+1.0);
}
